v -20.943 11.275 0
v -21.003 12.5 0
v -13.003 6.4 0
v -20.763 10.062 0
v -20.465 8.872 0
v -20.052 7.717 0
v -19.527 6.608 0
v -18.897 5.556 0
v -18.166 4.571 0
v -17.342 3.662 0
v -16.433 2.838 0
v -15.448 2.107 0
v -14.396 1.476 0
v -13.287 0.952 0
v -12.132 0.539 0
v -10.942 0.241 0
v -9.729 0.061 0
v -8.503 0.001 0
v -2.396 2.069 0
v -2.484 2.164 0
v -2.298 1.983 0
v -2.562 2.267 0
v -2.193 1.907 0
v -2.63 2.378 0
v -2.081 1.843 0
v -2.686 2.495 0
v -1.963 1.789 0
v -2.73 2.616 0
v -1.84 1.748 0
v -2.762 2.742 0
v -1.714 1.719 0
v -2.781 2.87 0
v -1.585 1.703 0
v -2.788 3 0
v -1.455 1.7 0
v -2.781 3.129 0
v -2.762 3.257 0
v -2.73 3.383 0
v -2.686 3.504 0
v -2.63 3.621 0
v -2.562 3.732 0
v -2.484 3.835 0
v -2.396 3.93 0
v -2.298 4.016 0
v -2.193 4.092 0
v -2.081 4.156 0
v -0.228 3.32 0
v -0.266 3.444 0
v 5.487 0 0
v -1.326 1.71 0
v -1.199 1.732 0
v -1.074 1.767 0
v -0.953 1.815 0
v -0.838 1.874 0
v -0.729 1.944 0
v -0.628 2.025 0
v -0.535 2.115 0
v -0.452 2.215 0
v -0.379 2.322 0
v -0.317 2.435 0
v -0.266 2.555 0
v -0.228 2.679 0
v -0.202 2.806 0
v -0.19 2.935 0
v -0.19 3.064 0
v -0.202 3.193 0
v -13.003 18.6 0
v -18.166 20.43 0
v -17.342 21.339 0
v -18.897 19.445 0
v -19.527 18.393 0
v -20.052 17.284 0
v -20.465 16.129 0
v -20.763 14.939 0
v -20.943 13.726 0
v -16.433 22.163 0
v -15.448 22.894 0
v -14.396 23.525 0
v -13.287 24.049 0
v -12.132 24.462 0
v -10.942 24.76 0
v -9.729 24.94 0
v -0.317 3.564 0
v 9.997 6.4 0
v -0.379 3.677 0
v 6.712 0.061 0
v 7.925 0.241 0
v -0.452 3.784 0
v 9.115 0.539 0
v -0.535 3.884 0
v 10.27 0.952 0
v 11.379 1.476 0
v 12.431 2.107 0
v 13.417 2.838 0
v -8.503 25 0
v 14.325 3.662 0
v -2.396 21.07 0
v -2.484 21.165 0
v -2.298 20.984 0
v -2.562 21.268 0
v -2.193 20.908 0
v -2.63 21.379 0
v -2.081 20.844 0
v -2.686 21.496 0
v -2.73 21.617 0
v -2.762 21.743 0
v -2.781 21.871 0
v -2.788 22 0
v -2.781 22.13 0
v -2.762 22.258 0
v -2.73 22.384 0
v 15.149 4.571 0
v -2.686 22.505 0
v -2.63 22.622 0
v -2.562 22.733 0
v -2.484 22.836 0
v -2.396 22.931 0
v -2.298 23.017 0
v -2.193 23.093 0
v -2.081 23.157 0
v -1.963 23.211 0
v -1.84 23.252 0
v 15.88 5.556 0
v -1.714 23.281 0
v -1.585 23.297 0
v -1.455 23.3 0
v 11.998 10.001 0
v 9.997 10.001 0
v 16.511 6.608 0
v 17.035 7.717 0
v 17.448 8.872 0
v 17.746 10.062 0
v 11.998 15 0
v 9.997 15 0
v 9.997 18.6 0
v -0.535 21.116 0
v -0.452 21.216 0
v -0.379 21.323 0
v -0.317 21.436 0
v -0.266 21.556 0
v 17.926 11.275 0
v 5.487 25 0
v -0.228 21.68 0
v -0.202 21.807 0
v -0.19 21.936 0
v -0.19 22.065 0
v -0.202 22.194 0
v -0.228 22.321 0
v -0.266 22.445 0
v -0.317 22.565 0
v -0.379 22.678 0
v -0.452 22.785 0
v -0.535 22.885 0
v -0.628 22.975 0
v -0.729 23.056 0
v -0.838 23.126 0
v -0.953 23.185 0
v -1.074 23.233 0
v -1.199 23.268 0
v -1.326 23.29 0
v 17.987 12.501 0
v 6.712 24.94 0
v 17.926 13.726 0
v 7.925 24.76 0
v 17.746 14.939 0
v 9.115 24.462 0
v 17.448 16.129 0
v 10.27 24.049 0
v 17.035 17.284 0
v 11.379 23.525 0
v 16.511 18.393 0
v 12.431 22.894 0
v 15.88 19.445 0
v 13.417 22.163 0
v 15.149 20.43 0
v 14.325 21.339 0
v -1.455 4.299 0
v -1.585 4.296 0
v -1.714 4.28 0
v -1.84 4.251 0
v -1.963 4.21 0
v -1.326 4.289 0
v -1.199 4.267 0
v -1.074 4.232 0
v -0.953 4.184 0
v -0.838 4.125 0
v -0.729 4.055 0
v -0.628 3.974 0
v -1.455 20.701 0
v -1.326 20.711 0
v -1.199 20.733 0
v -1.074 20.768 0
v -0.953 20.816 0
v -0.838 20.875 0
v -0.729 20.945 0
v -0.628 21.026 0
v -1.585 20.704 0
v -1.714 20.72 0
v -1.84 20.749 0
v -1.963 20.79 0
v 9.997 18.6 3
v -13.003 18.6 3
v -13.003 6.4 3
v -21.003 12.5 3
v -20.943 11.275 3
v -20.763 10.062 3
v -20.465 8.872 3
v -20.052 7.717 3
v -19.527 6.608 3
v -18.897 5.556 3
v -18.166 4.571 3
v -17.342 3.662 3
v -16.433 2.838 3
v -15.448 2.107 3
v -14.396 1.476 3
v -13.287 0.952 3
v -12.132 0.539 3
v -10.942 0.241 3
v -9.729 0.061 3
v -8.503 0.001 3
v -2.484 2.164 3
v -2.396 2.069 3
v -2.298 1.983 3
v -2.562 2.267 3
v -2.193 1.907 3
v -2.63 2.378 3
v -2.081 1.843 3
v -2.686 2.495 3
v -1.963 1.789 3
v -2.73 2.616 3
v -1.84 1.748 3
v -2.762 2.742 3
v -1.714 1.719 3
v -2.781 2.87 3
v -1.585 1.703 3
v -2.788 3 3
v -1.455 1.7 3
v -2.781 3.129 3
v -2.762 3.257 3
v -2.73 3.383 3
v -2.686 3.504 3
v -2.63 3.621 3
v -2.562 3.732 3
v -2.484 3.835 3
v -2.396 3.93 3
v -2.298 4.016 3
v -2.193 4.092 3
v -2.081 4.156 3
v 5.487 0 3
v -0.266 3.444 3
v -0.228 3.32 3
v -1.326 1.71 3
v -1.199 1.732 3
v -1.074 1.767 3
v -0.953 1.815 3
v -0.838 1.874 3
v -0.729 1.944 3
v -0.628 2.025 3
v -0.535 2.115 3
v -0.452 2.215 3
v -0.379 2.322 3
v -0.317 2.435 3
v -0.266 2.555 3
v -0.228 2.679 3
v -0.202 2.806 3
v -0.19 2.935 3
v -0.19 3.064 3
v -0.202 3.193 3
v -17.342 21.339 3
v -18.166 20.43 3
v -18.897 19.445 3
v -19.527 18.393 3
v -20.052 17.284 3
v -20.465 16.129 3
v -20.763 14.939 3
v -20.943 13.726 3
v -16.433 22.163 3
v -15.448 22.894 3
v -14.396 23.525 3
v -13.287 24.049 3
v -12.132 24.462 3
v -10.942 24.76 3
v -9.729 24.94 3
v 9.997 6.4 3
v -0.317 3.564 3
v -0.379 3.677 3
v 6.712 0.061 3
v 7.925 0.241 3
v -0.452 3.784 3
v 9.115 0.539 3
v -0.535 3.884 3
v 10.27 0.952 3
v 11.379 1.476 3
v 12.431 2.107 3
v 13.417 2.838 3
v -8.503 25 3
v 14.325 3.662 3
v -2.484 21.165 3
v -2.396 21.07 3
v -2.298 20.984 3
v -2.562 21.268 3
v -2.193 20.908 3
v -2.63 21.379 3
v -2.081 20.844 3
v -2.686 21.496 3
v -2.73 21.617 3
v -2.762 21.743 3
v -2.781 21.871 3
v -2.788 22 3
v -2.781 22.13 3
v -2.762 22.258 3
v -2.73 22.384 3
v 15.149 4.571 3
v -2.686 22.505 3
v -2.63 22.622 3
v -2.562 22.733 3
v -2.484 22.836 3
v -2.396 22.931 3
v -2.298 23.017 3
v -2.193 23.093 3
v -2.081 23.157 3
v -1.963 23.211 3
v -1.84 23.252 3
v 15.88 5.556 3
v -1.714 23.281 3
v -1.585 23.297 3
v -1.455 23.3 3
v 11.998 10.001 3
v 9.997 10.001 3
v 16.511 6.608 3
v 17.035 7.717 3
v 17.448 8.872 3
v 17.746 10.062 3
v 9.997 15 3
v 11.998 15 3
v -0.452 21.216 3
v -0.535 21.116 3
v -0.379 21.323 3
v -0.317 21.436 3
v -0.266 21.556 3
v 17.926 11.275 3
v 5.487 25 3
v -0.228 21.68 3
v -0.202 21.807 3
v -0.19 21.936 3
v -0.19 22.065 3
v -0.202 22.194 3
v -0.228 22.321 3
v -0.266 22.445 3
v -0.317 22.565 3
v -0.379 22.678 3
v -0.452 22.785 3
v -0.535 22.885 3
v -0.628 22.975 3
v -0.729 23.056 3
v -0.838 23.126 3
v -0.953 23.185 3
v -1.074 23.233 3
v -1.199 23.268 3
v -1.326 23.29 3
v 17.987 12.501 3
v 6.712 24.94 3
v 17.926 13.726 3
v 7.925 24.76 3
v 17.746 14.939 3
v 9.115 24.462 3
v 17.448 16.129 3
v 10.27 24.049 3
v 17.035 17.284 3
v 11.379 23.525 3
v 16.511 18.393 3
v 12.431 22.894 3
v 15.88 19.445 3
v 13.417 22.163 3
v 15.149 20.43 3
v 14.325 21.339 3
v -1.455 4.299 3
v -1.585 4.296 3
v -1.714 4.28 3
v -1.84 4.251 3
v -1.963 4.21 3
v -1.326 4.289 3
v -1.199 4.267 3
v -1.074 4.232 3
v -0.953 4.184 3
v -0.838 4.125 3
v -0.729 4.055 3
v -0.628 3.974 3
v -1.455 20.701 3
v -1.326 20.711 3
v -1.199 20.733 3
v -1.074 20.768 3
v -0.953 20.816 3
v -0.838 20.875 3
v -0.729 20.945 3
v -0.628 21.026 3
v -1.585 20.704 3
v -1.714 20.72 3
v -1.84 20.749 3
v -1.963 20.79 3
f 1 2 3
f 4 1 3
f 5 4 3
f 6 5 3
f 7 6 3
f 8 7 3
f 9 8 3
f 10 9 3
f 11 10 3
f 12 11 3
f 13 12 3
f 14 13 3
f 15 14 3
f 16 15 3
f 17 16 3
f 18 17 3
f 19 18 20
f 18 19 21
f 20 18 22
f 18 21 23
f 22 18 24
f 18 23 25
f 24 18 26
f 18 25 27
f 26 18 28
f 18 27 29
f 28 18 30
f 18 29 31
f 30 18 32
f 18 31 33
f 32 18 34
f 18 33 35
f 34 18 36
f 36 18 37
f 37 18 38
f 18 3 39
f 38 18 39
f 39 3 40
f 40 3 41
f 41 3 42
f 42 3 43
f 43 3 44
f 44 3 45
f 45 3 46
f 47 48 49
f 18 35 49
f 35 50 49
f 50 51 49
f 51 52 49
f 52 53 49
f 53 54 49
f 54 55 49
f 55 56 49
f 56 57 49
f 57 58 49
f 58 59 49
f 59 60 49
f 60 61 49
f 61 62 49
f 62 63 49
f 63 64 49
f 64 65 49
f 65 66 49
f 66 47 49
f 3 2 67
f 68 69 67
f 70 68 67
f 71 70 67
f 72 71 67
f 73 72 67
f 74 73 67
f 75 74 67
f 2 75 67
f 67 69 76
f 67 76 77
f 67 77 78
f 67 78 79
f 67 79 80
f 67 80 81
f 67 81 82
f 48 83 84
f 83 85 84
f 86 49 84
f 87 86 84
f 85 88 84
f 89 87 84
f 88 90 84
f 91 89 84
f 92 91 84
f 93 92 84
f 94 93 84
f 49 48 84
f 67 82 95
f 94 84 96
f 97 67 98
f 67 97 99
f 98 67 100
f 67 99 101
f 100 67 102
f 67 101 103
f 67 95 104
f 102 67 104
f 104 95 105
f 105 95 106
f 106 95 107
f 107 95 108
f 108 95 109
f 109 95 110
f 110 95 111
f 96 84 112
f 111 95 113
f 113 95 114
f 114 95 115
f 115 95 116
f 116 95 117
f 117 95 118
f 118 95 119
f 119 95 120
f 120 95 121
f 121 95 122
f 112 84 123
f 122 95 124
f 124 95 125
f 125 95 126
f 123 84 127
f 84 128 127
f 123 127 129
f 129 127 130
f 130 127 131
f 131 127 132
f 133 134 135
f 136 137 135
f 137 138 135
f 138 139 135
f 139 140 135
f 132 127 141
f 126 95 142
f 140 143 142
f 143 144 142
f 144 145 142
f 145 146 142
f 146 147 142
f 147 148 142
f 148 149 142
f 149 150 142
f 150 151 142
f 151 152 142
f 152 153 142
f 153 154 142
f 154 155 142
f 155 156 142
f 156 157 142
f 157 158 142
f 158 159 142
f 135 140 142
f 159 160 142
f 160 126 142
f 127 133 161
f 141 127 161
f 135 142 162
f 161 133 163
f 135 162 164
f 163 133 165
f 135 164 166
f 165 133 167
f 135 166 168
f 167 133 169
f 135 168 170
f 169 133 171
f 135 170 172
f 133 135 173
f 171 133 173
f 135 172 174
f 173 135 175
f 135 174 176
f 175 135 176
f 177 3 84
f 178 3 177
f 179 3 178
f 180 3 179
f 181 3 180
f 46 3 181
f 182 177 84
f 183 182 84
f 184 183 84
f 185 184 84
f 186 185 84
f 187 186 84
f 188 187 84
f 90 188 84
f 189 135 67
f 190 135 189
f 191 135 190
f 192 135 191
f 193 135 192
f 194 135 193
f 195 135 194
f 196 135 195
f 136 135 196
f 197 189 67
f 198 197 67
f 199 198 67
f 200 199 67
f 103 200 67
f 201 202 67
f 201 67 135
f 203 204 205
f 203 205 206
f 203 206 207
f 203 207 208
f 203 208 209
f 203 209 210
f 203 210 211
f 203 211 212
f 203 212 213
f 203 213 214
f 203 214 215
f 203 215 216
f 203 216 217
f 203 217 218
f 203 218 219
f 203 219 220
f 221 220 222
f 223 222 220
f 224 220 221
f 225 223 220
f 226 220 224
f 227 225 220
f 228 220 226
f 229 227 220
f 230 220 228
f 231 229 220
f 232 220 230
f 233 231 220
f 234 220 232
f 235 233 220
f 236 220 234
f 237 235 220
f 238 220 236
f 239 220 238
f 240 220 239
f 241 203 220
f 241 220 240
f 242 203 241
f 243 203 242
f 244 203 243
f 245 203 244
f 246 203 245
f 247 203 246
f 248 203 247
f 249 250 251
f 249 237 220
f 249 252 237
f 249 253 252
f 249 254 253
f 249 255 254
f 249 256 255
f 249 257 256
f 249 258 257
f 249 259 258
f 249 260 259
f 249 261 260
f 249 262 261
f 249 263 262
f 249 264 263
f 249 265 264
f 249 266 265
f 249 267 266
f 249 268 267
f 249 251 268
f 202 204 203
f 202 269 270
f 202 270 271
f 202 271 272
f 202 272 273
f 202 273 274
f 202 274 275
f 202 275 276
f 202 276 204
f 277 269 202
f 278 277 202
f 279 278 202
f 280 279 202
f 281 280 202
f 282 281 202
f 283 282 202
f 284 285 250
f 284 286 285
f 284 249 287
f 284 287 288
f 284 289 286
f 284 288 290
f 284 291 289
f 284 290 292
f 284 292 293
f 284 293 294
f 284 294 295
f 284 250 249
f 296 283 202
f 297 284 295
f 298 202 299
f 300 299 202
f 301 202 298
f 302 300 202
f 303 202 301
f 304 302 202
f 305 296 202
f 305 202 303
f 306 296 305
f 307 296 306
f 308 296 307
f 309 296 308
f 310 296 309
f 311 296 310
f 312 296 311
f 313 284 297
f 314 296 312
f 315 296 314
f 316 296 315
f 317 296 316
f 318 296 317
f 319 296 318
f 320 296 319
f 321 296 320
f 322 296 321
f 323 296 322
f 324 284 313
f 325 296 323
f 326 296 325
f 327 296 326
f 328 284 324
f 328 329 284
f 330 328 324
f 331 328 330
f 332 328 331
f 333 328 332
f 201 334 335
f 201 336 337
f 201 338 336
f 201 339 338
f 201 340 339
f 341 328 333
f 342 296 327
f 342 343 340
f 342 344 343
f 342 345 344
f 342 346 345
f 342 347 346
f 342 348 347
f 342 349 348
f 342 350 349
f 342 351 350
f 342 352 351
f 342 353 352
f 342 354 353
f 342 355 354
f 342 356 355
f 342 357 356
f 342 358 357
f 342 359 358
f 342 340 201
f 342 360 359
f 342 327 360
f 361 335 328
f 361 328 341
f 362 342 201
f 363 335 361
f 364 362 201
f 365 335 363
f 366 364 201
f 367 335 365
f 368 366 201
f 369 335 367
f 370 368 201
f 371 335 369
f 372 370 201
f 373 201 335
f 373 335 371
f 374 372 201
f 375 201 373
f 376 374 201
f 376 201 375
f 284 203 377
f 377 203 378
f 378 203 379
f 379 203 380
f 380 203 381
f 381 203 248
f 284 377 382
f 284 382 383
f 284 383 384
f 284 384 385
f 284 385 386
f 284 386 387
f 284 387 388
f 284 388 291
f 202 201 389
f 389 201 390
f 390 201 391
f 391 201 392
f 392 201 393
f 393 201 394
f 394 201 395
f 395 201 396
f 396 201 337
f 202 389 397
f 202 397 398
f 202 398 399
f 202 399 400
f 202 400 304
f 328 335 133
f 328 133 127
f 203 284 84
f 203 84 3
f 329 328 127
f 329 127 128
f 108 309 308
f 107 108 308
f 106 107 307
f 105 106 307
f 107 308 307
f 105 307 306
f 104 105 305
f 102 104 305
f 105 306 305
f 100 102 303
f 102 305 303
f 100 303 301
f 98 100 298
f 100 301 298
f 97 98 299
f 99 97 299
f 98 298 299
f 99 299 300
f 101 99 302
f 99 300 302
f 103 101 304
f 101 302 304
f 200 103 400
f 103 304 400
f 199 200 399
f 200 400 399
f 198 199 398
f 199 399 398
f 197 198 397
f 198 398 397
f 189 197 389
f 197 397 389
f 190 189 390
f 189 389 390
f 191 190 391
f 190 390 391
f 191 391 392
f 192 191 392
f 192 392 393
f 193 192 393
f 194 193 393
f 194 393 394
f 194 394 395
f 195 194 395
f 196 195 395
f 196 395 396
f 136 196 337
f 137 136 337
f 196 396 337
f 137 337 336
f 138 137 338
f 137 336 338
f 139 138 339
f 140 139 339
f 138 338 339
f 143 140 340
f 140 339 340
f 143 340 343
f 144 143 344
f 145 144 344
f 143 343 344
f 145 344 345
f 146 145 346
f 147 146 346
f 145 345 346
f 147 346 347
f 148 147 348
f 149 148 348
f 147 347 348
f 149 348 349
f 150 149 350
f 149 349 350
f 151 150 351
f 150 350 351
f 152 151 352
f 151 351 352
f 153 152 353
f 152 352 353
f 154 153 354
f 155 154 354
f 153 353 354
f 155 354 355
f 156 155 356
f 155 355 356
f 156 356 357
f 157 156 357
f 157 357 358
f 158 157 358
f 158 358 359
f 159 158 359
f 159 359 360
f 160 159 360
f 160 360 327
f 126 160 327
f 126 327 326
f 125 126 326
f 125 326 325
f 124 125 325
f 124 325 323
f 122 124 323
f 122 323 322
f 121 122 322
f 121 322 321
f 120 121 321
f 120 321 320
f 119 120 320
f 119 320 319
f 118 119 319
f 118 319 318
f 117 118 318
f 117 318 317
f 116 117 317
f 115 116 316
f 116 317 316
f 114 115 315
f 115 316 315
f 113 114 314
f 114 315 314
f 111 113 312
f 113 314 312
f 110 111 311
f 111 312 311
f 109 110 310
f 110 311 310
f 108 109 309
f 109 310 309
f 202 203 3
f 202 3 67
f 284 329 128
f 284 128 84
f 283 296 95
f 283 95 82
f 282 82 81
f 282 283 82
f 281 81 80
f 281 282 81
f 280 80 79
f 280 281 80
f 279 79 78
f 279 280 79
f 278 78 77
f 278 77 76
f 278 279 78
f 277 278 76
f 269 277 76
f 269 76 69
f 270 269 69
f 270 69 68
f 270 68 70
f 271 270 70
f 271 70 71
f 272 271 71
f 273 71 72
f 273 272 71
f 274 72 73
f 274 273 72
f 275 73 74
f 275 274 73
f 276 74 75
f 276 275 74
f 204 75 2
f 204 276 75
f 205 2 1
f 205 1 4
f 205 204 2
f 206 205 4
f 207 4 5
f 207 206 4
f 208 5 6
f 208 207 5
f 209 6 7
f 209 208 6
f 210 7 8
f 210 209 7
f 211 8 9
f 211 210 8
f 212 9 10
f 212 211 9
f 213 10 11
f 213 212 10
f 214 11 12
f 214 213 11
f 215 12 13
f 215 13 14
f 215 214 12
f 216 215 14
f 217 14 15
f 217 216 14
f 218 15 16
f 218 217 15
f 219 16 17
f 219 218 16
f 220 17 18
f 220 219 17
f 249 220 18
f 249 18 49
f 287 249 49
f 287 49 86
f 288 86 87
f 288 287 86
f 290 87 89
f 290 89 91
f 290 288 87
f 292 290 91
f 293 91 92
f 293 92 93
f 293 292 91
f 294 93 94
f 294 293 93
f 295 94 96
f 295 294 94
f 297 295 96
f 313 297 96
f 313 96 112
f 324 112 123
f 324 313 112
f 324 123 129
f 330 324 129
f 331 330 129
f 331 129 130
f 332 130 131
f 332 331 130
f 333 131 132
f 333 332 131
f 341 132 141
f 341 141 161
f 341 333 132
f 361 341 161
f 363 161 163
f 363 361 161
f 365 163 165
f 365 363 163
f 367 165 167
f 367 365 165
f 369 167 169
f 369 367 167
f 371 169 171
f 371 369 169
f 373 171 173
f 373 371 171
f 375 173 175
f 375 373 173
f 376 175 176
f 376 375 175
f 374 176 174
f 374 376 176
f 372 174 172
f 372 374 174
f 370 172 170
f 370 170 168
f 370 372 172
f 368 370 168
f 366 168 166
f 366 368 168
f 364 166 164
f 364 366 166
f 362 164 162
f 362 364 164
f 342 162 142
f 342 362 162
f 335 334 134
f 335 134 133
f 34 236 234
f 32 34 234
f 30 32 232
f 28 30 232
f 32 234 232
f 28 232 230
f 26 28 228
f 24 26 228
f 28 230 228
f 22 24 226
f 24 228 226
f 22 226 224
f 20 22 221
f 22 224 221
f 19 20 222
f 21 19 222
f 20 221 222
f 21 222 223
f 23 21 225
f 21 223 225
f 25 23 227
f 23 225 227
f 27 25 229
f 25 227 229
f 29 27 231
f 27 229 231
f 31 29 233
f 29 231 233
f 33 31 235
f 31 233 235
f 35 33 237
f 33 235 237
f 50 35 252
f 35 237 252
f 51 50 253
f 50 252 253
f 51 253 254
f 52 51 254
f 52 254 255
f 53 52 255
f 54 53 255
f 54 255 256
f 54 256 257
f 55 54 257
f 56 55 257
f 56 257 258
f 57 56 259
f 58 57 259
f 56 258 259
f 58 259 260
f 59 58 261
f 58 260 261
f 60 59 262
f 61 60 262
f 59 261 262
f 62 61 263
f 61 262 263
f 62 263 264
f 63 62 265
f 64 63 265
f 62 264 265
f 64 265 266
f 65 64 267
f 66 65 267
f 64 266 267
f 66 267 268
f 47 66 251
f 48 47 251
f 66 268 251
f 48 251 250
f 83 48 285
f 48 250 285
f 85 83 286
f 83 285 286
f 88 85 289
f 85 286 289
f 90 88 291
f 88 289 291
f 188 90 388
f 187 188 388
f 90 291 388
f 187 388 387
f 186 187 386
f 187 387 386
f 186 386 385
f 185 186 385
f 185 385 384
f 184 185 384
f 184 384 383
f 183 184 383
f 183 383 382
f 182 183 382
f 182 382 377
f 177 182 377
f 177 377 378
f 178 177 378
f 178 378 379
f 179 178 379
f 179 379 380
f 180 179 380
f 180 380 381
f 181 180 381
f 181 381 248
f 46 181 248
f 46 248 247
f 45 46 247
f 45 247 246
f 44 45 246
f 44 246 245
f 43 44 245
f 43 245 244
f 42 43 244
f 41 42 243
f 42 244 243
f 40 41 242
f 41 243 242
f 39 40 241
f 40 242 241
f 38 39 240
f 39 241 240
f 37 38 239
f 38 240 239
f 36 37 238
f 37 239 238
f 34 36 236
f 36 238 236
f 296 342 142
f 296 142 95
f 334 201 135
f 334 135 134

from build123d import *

# Parameters (mm, degrees)
SKETCH_1_R      = 1.3
EXTRUDE_1_DEPTH = 3


with BuildPart() as part:
    # 草图1 → 凸台-拉伸1 (new body)
    with BuildSketch(Plane.XY.offset(3)):
        with BuildLine():
            Line((-8.503322156, 0.0005), (5.486588529, 0.0005))
            ThreePointArc((5.486588529, 0.0005), (17.986588529, 12.5005), (5.486588529, 25.0005))
            Line((5.486588529, 25.0005), (-8.503322156, 25.0005))
            ThreePointArc((-8.503322156, 25.0005), (-21.003322156, 12.5005), (-8.503322156, 0.0005))
        make_face()
        with Locations(Location((-1.487905971, 2.9995, 0), (0, 0, 180))):
            Circle(SKETCH_1_R, mode=Mode.SUBTRACT)
        with Locations(Location((-1.487905971, 22.0005, 0), (0, 0, 180))):
            Circle(SKETCH_1_R, mode=Mode.SUBTRACT)
        Polygon((11.997794717, 15), (11.997794717, 10.001), (9.996894717, 10.001), (9.996894717, 6.4), (-13.002605283, 6.4), (-13.002605283, 18.6), (9.996894717, 18.6), (9.996894717, 15), align=None, mode=Mode.SUBTRACT)
    extrude(amount=-EXTRUDE_1_DEPTH)


solid = part.part
